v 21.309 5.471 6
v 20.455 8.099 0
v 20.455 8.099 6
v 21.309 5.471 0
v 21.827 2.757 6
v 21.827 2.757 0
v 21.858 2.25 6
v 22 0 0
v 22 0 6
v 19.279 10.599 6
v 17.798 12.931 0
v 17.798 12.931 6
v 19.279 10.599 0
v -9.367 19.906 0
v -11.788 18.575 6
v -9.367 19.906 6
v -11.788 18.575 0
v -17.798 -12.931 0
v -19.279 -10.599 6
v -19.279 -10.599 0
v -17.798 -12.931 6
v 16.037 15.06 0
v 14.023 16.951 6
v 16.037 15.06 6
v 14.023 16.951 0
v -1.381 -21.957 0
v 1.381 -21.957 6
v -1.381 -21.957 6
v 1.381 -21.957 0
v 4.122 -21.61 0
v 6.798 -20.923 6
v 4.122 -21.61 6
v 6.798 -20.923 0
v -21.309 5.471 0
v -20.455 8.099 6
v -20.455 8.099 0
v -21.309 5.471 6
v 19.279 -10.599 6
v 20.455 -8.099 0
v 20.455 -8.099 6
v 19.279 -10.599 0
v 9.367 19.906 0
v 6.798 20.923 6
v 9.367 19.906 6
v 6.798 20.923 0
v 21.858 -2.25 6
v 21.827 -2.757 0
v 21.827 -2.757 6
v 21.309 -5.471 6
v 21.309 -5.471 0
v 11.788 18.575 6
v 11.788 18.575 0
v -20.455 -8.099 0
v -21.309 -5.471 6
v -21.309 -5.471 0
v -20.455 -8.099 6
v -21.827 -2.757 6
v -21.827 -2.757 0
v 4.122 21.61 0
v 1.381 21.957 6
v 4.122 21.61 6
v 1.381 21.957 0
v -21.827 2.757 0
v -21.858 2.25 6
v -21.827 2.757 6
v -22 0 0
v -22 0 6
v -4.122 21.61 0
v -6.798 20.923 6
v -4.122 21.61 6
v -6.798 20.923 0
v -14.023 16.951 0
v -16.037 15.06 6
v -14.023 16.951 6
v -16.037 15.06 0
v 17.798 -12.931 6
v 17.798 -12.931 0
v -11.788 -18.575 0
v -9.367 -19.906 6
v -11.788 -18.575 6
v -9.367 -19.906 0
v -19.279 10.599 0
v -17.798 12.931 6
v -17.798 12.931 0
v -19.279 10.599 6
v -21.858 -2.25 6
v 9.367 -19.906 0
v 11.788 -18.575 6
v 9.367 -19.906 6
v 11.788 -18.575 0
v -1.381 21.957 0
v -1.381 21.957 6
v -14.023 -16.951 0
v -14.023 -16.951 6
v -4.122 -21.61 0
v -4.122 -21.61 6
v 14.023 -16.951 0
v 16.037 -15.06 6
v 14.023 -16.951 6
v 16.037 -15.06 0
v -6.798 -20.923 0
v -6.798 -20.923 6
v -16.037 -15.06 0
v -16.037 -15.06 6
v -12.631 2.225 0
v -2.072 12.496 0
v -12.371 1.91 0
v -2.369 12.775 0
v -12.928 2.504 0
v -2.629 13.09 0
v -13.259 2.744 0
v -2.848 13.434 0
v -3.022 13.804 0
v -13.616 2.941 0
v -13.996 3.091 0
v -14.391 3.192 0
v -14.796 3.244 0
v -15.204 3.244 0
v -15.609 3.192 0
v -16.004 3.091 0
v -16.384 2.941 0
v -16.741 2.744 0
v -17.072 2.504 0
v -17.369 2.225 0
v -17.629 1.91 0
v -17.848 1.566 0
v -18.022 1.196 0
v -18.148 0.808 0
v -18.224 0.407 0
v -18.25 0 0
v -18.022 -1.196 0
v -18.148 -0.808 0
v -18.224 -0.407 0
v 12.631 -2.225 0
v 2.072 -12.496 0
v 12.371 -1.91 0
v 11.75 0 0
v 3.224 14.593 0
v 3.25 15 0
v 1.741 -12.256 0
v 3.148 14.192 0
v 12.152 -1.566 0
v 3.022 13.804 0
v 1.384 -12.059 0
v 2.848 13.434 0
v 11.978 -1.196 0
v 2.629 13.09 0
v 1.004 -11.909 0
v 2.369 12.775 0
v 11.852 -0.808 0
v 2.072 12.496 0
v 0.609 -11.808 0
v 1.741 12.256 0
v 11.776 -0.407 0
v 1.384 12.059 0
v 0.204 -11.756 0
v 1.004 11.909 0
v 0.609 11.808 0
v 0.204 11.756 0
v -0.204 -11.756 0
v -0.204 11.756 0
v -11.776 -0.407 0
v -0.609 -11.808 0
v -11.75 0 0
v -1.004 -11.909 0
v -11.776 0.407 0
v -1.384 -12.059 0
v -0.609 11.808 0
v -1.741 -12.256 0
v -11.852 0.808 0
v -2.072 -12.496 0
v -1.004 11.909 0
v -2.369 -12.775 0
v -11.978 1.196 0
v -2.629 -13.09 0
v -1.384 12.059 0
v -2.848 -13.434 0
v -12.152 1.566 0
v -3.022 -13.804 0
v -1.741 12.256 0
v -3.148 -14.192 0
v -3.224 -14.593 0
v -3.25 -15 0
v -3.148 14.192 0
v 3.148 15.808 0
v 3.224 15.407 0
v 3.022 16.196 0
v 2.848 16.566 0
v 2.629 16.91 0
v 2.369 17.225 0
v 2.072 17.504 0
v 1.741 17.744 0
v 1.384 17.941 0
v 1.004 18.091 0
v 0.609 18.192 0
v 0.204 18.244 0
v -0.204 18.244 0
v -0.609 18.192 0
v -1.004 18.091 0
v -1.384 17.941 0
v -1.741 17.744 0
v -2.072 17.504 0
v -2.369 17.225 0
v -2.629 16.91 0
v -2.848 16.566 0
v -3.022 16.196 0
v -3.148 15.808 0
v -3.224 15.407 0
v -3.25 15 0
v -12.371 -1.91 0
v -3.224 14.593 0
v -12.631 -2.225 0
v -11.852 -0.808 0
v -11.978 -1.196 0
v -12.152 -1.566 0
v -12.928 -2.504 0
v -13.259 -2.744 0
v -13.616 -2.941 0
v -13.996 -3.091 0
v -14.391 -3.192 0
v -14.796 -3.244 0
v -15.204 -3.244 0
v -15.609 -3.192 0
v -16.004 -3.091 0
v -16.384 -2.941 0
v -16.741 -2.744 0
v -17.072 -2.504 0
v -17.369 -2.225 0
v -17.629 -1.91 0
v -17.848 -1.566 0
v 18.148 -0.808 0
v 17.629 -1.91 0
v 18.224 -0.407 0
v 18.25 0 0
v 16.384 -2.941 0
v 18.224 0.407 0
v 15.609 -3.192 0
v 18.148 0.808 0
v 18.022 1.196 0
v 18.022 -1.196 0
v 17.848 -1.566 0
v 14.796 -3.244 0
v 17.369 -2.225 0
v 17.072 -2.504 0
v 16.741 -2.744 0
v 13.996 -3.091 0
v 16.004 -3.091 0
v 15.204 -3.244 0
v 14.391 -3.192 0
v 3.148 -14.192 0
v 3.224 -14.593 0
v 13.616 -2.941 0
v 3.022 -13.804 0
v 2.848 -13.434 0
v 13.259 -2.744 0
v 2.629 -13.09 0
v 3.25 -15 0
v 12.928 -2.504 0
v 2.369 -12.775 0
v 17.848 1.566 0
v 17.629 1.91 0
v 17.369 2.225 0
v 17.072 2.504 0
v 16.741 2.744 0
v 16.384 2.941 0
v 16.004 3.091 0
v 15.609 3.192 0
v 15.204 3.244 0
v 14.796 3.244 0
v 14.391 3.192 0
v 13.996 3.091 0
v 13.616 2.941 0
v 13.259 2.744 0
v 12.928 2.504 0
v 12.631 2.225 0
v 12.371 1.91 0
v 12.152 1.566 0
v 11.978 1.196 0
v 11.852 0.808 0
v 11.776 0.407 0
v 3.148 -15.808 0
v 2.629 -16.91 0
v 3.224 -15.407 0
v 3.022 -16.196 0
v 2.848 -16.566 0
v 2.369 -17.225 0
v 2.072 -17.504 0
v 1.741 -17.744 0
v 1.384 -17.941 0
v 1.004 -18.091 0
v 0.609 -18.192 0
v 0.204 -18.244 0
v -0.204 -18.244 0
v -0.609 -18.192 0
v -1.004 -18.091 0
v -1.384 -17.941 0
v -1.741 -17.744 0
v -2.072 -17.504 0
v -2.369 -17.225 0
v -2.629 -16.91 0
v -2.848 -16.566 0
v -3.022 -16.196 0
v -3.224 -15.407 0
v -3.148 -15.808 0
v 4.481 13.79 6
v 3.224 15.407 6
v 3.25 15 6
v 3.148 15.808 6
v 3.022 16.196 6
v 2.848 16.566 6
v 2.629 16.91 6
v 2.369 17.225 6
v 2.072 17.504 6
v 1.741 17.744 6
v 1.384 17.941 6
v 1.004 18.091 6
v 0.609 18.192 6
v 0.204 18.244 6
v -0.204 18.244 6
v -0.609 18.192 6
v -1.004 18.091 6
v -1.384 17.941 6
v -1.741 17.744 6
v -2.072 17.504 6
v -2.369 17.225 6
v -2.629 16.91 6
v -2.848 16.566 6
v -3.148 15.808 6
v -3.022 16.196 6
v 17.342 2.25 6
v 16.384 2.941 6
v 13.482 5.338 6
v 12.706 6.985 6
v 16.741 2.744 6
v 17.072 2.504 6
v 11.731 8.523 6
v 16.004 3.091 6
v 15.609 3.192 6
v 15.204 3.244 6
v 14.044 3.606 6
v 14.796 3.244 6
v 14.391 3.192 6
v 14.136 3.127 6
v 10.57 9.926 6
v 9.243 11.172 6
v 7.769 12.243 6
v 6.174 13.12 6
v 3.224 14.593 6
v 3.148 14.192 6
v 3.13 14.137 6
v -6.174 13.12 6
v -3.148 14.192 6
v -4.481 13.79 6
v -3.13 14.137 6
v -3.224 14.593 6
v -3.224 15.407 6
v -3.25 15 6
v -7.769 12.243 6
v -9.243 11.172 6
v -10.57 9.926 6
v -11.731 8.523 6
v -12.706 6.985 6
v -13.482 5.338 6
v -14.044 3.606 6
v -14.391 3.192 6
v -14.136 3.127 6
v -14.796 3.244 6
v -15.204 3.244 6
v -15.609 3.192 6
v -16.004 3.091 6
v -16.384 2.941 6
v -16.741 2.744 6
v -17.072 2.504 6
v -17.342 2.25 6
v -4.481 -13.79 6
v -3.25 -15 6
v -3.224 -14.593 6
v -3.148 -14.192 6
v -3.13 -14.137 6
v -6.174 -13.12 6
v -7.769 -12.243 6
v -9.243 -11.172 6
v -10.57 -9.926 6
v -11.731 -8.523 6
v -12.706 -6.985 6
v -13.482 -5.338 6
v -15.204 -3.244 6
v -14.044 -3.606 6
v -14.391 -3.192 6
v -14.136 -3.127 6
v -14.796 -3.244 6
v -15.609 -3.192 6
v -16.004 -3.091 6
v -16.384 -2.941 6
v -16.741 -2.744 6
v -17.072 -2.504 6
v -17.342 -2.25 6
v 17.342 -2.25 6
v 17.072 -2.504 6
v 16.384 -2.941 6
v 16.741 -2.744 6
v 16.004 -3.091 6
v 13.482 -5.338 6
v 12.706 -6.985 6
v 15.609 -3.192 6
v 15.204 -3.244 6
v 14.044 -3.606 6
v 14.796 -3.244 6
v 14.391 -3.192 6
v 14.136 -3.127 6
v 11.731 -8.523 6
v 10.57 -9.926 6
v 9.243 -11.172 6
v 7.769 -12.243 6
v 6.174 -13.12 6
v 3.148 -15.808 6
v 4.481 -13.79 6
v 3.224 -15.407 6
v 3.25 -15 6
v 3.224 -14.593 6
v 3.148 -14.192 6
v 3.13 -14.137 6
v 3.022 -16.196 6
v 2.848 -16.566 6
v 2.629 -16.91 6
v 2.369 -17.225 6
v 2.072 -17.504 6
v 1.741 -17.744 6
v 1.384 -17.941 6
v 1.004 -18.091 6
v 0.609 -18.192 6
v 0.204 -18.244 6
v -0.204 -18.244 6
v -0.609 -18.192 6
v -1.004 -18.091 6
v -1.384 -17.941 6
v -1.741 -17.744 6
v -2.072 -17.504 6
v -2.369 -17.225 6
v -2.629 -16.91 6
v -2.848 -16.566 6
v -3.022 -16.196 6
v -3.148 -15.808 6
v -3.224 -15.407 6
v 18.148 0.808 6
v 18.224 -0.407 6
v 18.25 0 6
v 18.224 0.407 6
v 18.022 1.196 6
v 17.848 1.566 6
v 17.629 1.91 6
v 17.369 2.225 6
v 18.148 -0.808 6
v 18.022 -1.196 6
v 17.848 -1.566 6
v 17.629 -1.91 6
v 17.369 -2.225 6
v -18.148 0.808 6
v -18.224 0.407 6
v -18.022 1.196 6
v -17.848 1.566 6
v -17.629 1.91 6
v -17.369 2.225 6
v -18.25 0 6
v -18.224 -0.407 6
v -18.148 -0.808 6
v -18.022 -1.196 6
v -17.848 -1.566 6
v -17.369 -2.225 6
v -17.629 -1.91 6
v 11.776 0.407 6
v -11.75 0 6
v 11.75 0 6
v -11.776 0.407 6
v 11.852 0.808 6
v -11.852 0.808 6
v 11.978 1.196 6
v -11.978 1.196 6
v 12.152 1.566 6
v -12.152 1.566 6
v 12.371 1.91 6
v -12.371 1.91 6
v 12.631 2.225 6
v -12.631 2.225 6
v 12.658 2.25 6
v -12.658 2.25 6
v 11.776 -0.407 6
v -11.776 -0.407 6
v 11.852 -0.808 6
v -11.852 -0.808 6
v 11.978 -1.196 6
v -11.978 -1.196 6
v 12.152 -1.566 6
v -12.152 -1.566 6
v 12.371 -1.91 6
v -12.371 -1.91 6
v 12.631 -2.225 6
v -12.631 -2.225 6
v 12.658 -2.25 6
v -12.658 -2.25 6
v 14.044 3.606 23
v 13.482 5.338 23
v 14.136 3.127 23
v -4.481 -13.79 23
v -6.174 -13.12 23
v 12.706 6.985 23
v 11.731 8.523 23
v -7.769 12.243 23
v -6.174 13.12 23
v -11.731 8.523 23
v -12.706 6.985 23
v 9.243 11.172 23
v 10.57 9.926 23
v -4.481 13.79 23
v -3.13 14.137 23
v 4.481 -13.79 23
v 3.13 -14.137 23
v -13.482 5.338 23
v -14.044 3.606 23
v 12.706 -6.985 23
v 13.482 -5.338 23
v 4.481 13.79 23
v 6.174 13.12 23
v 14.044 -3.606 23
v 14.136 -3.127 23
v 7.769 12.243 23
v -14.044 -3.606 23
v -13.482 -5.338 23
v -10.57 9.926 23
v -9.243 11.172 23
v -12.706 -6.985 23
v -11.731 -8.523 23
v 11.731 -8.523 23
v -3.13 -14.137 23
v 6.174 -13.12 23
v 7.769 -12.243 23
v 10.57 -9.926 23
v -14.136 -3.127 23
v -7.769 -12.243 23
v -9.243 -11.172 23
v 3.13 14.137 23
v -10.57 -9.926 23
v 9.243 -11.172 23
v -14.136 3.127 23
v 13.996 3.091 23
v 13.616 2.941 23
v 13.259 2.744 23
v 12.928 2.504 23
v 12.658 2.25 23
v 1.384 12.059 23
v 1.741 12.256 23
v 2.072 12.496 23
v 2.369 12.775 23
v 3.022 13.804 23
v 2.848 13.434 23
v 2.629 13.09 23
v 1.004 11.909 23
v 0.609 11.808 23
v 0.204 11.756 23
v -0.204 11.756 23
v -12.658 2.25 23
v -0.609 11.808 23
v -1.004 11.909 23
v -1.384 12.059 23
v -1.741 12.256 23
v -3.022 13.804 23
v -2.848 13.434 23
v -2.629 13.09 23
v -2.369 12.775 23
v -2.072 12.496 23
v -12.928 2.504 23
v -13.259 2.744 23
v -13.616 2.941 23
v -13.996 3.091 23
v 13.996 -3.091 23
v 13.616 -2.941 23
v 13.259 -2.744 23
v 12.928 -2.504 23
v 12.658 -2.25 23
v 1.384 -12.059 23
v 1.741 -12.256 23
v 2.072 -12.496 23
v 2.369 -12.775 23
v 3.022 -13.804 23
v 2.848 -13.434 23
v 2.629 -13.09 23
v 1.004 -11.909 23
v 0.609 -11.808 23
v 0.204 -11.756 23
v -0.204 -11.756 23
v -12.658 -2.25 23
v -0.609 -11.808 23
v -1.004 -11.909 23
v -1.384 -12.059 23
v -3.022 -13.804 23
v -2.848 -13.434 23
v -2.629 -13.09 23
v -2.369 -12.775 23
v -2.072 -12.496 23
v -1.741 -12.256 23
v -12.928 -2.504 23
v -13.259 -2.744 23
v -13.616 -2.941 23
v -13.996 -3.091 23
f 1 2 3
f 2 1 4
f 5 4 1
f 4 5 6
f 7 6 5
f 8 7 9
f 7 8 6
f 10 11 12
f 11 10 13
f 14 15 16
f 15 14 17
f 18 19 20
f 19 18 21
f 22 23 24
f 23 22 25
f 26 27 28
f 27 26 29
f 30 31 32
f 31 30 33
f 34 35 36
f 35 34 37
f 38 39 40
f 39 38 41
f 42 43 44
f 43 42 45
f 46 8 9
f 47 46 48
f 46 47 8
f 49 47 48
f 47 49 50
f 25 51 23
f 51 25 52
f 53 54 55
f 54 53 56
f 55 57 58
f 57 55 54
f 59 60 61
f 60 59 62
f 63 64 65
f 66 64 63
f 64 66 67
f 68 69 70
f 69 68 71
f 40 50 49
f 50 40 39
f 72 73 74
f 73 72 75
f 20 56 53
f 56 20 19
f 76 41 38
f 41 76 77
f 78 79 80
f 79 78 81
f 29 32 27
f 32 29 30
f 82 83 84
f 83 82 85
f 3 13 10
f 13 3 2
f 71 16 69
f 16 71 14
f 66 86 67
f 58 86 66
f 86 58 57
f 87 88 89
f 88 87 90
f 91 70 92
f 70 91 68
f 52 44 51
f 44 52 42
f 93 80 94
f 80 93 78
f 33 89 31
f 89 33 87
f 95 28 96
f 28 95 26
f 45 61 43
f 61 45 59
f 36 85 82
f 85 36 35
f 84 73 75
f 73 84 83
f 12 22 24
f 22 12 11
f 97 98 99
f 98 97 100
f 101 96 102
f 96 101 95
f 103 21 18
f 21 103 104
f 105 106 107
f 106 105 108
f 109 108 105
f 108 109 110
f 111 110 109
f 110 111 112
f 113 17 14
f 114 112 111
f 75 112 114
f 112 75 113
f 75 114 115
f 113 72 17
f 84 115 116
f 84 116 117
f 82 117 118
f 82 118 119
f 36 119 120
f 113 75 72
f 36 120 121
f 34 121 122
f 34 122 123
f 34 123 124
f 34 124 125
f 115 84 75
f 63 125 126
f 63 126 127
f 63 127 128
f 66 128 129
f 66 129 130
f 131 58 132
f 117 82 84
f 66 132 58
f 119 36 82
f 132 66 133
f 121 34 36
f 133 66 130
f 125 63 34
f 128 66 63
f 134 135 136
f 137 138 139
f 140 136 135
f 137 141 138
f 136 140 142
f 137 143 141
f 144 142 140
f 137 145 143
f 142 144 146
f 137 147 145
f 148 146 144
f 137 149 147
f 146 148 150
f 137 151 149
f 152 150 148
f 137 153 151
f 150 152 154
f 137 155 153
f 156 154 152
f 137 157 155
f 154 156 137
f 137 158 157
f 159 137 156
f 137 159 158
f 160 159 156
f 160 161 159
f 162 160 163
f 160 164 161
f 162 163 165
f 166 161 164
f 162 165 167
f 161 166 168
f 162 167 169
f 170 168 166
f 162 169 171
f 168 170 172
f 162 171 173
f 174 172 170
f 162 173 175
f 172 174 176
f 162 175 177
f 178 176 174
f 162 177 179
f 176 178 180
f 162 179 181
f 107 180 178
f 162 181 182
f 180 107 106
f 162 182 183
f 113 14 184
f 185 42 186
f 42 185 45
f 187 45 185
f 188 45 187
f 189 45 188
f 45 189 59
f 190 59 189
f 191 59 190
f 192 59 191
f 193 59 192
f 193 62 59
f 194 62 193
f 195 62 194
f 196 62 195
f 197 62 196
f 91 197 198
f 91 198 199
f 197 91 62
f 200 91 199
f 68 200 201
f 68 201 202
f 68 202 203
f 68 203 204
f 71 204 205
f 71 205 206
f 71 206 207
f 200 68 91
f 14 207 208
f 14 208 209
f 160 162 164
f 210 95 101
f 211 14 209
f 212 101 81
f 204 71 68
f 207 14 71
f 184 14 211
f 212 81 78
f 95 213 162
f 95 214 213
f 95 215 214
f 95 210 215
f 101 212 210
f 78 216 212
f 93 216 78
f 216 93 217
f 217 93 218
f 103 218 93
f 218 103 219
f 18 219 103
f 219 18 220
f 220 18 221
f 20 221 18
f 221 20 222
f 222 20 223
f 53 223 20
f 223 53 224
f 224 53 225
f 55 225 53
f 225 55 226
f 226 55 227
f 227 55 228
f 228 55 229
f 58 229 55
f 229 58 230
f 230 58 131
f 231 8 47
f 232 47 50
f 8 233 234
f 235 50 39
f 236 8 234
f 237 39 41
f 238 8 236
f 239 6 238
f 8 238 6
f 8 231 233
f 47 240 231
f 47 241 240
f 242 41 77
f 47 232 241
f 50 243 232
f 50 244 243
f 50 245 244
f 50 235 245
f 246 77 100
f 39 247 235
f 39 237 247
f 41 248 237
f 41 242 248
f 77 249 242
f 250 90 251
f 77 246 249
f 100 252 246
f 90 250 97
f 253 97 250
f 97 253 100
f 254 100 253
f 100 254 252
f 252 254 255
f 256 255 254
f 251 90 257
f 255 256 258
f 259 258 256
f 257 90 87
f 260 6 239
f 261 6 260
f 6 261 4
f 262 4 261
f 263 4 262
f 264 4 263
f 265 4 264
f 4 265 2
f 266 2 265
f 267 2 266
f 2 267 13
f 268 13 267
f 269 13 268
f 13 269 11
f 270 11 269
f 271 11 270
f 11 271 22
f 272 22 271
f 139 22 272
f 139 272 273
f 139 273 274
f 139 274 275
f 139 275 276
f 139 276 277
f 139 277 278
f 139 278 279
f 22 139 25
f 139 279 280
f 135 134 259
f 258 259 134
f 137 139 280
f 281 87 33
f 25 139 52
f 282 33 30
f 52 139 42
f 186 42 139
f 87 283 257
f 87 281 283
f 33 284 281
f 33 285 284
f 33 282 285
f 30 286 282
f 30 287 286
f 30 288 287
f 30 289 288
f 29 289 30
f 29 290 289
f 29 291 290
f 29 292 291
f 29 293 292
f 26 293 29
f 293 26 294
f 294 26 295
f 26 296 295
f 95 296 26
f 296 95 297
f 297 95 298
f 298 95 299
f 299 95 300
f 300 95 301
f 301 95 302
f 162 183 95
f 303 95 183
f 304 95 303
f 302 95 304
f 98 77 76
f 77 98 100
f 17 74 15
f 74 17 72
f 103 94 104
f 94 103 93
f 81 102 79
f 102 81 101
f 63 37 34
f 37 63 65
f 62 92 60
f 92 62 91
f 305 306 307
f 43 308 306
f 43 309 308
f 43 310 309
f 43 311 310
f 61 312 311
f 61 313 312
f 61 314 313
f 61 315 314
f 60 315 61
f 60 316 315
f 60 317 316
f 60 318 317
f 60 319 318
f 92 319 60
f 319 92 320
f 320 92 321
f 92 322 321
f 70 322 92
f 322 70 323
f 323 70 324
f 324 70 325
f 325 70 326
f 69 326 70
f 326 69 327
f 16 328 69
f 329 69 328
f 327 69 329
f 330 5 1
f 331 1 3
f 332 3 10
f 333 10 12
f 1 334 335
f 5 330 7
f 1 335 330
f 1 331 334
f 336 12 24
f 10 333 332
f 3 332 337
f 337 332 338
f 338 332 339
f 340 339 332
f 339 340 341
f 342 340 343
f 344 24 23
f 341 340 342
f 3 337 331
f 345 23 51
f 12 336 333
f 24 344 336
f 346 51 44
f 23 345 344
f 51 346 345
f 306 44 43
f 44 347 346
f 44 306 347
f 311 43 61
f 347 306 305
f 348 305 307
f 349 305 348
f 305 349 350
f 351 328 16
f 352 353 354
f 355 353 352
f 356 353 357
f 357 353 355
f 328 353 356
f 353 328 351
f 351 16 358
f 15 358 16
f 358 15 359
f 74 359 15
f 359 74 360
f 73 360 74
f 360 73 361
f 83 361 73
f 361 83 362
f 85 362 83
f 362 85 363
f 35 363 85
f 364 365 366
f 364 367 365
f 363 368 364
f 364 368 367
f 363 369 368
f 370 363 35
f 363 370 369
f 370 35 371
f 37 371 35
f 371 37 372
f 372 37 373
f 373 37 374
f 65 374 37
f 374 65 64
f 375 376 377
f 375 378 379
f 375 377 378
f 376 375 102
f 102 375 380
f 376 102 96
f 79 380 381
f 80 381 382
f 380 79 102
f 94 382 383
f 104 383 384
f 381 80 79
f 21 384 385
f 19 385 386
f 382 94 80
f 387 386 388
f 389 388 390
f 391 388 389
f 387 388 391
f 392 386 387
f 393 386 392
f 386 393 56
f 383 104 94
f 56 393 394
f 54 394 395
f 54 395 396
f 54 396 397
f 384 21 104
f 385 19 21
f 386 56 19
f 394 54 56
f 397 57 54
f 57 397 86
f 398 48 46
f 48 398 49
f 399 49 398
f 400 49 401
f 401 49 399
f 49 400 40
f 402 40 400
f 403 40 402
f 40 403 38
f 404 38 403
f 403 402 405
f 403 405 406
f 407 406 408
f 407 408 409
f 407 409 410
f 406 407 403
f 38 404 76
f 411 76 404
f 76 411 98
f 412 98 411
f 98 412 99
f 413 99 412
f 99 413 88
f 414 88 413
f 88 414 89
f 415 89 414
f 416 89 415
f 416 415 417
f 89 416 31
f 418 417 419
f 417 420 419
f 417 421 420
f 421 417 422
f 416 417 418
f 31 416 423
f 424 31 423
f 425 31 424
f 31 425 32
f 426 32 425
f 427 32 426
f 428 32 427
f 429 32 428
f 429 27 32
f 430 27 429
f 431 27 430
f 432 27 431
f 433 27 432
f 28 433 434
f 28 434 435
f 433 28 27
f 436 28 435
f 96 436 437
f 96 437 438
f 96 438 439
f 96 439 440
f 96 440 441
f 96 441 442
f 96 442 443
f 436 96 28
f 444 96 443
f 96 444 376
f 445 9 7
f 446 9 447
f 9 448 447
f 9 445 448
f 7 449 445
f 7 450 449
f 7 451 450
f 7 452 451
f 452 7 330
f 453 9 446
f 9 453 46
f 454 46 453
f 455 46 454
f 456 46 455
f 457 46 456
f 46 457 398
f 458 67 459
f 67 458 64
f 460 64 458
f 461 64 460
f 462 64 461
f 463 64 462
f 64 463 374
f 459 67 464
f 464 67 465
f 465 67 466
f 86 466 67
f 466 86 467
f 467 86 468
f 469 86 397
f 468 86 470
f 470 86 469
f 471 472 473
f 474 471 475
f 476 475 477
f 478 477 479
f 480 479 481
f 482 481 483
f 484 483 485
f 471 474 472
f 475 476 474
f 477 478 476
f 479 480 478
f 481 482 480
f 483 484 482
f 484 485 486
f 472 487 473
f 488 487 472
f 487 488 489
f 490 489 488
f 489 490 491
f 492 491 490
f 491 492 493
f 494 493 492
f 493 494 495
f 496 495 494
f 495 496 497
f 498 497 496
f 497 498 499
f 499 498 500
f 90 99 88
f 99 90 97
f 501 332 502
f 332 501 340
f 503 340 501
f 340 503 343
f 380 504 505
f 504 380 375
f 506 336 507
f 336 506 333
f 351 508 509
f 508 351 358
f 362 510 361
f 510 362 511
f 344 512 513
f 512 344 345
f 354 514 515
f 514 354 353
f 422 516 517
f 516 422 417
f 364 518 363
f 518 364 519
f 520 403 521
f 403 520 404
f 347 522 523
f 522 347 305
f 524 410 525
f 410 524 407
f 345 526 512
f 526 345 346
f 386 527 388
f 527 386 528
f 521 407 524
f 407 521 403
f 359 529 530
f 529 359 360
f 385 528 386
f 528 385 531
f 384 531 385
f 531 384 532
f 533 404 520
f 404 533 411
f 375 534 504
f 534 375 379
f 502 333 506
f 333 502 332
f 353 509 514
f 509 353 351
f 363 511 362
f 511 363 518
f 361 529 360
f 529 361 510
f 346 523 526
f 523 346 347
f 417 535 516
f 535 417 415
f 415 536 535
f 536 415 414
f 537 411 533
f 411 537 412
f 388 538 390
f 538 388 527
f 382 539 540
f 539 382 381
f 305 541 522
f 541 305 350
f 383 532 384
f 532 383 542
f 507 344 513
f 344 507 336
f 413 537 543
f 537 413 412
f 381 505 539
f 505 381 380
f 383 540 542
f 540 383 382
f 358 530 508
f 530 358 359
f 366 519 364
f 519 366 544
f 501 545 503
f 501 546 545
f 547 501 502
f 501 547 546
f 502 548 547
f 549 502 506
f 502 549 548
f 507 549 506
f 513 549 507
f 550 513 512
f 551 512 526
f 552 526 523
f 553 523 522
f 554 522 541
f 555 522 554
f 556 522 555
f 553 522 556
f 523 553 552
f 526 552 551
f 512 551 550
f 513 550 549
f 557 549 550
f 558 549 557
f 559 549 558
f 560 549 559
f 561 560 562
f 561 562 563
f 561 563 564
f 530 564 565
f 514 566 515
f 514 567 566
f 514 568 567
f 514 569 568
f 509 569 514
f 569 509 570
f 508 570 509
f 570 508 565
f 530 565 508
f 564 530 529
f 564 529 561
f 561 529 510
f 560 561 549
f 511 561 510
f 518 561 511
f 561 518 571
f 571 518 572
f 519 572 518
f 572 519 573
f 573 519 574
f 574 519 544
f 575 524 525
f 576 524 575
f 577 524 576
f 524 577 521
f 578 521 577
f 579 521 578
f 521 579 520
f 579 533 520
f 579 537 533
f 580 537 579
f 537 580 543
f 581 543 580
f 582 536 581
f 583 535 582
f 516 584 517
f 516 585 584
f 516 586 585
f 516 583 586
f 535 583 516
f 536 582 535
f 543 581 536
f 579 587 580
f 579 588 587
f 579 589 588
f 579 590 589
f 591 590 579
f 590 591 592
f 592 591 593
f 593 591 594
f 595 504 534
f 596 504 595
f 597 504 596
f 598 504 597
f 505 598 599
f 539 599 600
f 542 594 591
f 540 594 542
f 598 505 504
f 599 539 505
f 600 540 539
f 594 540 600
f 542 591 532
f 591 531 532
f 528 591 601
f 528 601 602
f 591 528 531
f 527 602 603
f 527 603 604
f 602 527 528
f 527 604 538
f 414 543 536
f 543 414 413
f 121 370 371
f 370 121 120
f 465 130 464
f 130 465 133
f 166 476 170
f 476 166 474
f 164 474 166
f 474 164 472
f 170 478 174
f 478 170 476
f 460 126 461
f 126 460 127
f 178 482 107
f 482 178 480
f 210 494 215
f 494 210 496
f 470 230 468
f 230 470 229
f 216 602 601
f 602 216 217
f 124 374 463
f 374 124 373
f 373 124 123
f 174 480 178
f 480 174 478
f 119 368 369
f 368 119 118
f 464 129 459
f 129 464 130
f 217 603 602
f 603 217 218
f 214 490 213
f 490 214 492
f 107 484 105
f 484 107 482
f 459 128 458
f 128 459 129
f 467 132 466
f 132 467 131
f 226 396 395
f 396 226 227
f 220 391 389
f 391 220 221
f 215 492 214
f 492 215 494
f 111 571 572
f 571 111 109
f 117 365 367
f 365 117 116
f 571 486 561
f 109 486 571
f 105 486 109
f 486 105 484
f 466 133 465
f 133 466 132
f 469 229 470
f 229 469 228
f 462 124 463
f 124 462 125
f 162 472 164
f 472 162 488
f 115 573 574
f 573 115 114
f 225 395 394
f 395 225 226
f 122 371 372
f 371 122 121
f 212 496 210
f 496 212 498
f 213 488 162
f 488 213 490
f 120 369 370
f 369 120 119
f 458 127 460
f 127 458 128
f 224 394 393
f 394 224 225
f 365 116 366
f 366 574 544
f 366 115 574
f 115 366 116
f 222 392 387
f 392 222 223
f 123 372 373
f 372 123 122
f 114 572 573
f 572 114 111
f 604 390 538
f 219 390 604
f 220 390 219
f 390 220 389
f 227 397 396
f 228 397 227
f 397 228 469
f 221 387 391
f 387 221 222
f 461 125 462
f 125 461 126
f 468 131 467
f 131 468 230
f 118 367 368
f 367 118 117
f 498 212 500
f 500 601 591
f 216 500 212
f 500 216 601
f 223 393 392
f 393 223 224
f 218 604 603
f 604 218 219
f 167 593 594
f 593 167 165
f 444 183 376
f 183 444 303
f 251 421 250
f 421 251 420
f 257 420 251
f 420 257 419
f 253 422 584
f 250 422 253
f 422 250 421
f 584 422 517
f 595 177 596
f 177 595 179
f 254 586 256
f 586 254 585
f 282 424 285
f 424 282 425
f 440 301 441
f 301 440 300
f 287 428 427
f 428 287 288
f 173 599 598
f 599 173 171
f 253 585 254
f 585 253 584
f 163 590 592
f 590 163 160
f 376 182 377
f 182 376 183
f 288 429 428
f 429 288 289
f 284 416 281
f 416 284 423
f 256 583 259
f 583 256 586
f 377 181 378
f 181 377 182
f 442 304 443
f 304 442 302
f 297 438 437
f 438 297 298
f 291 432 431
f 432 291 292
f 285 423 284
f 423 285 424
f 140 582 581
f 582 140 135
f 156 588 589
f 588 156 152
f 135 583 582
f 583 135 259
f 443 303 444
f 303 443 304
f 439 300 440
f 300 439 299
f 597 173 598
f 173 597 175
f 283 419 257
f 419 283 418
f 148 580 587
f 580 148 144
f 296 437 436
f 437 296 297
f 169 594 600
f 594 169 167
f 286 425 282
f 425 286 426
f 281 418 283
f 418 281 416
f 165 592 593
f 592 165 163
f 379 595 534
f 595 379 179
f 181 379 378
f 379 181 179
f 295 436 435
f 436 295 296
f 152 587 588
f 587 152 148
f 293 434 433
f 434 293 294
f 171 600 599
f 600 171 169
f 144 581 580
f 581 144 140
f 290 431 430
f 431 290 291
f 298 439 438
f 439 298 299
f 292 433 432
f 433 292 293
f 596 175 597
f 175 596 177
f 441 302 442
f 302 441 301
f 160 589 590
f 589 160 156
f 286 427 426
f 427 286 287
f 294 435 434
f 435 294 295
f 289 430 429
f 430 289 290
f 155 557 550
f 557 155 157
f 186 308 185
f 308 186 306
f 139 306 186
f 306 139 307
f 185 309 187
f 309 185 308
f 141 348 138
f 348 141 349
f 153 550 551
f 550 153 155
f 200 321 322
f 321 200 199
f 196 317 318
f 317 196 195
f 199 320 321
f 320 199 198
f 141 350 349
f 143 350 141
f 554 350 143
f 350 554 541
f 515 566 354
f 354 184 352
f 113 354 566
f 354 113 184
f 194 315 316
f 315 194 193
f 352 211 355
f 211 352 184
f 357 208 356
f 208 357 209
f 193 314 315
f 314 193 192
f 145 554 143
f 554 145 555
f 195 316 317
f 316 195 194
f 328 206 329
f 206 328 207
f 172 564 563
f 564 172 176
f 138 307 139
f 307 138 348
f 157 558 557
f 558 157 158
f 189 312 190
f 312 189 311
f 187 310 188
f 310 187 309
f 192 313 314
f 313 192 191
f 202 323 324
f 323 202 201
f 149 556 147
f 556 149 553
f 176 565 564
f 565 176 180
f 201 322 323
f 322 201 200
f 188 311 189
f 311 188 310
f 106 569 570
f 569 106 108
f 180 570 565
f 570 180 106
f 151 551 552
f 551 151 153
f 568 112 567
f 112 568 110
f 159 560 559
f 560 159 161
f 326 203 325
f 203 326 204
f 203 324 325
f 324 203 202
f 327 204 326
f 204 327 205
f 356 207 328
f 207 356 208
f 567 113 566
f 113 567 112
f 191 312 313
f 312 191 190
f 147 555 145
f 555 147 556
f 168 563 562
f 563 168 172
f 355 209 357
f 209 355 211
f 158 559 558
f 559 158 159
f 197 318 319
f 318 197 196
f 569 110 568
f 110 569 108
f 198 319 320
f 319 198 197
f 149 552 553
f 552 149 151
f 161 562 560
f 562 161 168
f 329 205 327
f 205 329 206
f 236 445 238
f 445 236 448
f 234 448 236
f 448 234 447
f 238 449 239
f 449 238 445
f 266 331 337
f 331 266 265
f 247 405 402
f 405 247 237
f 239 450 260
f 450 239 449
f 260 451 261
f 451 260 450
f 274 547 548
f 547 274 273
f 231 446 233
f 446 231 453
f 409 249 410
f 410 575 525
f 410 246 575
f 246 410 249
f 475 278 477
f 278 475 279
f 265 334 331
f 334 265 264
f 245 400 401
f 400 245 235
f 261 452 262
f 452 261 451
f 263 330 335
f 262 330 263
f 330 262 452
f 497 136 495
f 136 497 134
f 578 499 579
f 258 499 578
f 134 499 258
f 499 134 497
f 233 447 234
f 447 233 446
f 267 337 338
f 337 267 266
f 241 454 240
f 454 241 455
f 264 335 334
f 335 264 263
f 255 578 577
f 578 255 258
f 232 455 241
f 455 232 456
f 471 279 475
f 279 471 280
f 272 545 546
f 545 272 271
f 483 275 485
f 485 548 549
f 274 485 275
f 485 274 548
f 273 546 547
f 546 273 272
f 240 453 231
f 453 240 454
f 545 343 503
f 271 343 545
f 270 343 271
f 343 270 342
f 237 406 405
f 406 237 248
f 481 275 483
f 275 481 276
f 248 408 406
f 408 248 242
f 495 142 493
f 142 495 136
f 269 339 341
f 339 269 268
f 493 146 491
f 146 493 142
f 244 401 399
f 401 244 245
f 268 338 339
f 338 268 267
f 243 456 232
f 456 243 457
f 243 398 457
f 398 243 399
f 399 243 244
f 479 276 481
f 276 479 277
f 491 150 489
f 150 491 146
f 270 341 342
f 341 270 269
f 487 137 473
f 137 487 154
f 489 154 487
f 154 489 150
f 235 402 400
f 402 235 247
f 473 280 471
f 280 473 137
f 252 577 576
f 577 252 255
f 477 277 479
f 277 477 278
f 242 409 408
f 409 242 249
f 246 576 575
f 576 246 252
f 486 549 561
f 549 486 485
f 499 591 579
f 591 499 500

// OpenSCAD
$fn = 50;


difference() {
	union() {
		cylinder(h = 6, r = 22.0000000000);
		translate(v = [0, 0, 3.0000000000]) {
			cylinder(h = 20, r = 14.5000000000);
		}
	}
	union() {
		translate(v = [-15.0000000000, 0.0000000000, -50.0000000000]) {
			cylinder(h = 100, r = 3.2500000000);
		}
		translate(v = [0.0000000000, -15.0000000000, -50.0000000000]) {
			cylinder(h = 100, r = 3.2500000000);
		}
		translate(v = [0.0000000000, 15.0000000000, -50.0000000000]) {
			cylinder(h = 100, r = 3.2500000000);
		}
		translate(v = [15.0000000000, 0.0000000000, -50.0000000000]) {
			cylinder(h = 100, r = 3.2500000000);
		}
		translate(v = [-27.0000000000, -2.2500000000, 6]) {
			cube(size = [54, 4.5000000000, 20]);
		}
	}
}
